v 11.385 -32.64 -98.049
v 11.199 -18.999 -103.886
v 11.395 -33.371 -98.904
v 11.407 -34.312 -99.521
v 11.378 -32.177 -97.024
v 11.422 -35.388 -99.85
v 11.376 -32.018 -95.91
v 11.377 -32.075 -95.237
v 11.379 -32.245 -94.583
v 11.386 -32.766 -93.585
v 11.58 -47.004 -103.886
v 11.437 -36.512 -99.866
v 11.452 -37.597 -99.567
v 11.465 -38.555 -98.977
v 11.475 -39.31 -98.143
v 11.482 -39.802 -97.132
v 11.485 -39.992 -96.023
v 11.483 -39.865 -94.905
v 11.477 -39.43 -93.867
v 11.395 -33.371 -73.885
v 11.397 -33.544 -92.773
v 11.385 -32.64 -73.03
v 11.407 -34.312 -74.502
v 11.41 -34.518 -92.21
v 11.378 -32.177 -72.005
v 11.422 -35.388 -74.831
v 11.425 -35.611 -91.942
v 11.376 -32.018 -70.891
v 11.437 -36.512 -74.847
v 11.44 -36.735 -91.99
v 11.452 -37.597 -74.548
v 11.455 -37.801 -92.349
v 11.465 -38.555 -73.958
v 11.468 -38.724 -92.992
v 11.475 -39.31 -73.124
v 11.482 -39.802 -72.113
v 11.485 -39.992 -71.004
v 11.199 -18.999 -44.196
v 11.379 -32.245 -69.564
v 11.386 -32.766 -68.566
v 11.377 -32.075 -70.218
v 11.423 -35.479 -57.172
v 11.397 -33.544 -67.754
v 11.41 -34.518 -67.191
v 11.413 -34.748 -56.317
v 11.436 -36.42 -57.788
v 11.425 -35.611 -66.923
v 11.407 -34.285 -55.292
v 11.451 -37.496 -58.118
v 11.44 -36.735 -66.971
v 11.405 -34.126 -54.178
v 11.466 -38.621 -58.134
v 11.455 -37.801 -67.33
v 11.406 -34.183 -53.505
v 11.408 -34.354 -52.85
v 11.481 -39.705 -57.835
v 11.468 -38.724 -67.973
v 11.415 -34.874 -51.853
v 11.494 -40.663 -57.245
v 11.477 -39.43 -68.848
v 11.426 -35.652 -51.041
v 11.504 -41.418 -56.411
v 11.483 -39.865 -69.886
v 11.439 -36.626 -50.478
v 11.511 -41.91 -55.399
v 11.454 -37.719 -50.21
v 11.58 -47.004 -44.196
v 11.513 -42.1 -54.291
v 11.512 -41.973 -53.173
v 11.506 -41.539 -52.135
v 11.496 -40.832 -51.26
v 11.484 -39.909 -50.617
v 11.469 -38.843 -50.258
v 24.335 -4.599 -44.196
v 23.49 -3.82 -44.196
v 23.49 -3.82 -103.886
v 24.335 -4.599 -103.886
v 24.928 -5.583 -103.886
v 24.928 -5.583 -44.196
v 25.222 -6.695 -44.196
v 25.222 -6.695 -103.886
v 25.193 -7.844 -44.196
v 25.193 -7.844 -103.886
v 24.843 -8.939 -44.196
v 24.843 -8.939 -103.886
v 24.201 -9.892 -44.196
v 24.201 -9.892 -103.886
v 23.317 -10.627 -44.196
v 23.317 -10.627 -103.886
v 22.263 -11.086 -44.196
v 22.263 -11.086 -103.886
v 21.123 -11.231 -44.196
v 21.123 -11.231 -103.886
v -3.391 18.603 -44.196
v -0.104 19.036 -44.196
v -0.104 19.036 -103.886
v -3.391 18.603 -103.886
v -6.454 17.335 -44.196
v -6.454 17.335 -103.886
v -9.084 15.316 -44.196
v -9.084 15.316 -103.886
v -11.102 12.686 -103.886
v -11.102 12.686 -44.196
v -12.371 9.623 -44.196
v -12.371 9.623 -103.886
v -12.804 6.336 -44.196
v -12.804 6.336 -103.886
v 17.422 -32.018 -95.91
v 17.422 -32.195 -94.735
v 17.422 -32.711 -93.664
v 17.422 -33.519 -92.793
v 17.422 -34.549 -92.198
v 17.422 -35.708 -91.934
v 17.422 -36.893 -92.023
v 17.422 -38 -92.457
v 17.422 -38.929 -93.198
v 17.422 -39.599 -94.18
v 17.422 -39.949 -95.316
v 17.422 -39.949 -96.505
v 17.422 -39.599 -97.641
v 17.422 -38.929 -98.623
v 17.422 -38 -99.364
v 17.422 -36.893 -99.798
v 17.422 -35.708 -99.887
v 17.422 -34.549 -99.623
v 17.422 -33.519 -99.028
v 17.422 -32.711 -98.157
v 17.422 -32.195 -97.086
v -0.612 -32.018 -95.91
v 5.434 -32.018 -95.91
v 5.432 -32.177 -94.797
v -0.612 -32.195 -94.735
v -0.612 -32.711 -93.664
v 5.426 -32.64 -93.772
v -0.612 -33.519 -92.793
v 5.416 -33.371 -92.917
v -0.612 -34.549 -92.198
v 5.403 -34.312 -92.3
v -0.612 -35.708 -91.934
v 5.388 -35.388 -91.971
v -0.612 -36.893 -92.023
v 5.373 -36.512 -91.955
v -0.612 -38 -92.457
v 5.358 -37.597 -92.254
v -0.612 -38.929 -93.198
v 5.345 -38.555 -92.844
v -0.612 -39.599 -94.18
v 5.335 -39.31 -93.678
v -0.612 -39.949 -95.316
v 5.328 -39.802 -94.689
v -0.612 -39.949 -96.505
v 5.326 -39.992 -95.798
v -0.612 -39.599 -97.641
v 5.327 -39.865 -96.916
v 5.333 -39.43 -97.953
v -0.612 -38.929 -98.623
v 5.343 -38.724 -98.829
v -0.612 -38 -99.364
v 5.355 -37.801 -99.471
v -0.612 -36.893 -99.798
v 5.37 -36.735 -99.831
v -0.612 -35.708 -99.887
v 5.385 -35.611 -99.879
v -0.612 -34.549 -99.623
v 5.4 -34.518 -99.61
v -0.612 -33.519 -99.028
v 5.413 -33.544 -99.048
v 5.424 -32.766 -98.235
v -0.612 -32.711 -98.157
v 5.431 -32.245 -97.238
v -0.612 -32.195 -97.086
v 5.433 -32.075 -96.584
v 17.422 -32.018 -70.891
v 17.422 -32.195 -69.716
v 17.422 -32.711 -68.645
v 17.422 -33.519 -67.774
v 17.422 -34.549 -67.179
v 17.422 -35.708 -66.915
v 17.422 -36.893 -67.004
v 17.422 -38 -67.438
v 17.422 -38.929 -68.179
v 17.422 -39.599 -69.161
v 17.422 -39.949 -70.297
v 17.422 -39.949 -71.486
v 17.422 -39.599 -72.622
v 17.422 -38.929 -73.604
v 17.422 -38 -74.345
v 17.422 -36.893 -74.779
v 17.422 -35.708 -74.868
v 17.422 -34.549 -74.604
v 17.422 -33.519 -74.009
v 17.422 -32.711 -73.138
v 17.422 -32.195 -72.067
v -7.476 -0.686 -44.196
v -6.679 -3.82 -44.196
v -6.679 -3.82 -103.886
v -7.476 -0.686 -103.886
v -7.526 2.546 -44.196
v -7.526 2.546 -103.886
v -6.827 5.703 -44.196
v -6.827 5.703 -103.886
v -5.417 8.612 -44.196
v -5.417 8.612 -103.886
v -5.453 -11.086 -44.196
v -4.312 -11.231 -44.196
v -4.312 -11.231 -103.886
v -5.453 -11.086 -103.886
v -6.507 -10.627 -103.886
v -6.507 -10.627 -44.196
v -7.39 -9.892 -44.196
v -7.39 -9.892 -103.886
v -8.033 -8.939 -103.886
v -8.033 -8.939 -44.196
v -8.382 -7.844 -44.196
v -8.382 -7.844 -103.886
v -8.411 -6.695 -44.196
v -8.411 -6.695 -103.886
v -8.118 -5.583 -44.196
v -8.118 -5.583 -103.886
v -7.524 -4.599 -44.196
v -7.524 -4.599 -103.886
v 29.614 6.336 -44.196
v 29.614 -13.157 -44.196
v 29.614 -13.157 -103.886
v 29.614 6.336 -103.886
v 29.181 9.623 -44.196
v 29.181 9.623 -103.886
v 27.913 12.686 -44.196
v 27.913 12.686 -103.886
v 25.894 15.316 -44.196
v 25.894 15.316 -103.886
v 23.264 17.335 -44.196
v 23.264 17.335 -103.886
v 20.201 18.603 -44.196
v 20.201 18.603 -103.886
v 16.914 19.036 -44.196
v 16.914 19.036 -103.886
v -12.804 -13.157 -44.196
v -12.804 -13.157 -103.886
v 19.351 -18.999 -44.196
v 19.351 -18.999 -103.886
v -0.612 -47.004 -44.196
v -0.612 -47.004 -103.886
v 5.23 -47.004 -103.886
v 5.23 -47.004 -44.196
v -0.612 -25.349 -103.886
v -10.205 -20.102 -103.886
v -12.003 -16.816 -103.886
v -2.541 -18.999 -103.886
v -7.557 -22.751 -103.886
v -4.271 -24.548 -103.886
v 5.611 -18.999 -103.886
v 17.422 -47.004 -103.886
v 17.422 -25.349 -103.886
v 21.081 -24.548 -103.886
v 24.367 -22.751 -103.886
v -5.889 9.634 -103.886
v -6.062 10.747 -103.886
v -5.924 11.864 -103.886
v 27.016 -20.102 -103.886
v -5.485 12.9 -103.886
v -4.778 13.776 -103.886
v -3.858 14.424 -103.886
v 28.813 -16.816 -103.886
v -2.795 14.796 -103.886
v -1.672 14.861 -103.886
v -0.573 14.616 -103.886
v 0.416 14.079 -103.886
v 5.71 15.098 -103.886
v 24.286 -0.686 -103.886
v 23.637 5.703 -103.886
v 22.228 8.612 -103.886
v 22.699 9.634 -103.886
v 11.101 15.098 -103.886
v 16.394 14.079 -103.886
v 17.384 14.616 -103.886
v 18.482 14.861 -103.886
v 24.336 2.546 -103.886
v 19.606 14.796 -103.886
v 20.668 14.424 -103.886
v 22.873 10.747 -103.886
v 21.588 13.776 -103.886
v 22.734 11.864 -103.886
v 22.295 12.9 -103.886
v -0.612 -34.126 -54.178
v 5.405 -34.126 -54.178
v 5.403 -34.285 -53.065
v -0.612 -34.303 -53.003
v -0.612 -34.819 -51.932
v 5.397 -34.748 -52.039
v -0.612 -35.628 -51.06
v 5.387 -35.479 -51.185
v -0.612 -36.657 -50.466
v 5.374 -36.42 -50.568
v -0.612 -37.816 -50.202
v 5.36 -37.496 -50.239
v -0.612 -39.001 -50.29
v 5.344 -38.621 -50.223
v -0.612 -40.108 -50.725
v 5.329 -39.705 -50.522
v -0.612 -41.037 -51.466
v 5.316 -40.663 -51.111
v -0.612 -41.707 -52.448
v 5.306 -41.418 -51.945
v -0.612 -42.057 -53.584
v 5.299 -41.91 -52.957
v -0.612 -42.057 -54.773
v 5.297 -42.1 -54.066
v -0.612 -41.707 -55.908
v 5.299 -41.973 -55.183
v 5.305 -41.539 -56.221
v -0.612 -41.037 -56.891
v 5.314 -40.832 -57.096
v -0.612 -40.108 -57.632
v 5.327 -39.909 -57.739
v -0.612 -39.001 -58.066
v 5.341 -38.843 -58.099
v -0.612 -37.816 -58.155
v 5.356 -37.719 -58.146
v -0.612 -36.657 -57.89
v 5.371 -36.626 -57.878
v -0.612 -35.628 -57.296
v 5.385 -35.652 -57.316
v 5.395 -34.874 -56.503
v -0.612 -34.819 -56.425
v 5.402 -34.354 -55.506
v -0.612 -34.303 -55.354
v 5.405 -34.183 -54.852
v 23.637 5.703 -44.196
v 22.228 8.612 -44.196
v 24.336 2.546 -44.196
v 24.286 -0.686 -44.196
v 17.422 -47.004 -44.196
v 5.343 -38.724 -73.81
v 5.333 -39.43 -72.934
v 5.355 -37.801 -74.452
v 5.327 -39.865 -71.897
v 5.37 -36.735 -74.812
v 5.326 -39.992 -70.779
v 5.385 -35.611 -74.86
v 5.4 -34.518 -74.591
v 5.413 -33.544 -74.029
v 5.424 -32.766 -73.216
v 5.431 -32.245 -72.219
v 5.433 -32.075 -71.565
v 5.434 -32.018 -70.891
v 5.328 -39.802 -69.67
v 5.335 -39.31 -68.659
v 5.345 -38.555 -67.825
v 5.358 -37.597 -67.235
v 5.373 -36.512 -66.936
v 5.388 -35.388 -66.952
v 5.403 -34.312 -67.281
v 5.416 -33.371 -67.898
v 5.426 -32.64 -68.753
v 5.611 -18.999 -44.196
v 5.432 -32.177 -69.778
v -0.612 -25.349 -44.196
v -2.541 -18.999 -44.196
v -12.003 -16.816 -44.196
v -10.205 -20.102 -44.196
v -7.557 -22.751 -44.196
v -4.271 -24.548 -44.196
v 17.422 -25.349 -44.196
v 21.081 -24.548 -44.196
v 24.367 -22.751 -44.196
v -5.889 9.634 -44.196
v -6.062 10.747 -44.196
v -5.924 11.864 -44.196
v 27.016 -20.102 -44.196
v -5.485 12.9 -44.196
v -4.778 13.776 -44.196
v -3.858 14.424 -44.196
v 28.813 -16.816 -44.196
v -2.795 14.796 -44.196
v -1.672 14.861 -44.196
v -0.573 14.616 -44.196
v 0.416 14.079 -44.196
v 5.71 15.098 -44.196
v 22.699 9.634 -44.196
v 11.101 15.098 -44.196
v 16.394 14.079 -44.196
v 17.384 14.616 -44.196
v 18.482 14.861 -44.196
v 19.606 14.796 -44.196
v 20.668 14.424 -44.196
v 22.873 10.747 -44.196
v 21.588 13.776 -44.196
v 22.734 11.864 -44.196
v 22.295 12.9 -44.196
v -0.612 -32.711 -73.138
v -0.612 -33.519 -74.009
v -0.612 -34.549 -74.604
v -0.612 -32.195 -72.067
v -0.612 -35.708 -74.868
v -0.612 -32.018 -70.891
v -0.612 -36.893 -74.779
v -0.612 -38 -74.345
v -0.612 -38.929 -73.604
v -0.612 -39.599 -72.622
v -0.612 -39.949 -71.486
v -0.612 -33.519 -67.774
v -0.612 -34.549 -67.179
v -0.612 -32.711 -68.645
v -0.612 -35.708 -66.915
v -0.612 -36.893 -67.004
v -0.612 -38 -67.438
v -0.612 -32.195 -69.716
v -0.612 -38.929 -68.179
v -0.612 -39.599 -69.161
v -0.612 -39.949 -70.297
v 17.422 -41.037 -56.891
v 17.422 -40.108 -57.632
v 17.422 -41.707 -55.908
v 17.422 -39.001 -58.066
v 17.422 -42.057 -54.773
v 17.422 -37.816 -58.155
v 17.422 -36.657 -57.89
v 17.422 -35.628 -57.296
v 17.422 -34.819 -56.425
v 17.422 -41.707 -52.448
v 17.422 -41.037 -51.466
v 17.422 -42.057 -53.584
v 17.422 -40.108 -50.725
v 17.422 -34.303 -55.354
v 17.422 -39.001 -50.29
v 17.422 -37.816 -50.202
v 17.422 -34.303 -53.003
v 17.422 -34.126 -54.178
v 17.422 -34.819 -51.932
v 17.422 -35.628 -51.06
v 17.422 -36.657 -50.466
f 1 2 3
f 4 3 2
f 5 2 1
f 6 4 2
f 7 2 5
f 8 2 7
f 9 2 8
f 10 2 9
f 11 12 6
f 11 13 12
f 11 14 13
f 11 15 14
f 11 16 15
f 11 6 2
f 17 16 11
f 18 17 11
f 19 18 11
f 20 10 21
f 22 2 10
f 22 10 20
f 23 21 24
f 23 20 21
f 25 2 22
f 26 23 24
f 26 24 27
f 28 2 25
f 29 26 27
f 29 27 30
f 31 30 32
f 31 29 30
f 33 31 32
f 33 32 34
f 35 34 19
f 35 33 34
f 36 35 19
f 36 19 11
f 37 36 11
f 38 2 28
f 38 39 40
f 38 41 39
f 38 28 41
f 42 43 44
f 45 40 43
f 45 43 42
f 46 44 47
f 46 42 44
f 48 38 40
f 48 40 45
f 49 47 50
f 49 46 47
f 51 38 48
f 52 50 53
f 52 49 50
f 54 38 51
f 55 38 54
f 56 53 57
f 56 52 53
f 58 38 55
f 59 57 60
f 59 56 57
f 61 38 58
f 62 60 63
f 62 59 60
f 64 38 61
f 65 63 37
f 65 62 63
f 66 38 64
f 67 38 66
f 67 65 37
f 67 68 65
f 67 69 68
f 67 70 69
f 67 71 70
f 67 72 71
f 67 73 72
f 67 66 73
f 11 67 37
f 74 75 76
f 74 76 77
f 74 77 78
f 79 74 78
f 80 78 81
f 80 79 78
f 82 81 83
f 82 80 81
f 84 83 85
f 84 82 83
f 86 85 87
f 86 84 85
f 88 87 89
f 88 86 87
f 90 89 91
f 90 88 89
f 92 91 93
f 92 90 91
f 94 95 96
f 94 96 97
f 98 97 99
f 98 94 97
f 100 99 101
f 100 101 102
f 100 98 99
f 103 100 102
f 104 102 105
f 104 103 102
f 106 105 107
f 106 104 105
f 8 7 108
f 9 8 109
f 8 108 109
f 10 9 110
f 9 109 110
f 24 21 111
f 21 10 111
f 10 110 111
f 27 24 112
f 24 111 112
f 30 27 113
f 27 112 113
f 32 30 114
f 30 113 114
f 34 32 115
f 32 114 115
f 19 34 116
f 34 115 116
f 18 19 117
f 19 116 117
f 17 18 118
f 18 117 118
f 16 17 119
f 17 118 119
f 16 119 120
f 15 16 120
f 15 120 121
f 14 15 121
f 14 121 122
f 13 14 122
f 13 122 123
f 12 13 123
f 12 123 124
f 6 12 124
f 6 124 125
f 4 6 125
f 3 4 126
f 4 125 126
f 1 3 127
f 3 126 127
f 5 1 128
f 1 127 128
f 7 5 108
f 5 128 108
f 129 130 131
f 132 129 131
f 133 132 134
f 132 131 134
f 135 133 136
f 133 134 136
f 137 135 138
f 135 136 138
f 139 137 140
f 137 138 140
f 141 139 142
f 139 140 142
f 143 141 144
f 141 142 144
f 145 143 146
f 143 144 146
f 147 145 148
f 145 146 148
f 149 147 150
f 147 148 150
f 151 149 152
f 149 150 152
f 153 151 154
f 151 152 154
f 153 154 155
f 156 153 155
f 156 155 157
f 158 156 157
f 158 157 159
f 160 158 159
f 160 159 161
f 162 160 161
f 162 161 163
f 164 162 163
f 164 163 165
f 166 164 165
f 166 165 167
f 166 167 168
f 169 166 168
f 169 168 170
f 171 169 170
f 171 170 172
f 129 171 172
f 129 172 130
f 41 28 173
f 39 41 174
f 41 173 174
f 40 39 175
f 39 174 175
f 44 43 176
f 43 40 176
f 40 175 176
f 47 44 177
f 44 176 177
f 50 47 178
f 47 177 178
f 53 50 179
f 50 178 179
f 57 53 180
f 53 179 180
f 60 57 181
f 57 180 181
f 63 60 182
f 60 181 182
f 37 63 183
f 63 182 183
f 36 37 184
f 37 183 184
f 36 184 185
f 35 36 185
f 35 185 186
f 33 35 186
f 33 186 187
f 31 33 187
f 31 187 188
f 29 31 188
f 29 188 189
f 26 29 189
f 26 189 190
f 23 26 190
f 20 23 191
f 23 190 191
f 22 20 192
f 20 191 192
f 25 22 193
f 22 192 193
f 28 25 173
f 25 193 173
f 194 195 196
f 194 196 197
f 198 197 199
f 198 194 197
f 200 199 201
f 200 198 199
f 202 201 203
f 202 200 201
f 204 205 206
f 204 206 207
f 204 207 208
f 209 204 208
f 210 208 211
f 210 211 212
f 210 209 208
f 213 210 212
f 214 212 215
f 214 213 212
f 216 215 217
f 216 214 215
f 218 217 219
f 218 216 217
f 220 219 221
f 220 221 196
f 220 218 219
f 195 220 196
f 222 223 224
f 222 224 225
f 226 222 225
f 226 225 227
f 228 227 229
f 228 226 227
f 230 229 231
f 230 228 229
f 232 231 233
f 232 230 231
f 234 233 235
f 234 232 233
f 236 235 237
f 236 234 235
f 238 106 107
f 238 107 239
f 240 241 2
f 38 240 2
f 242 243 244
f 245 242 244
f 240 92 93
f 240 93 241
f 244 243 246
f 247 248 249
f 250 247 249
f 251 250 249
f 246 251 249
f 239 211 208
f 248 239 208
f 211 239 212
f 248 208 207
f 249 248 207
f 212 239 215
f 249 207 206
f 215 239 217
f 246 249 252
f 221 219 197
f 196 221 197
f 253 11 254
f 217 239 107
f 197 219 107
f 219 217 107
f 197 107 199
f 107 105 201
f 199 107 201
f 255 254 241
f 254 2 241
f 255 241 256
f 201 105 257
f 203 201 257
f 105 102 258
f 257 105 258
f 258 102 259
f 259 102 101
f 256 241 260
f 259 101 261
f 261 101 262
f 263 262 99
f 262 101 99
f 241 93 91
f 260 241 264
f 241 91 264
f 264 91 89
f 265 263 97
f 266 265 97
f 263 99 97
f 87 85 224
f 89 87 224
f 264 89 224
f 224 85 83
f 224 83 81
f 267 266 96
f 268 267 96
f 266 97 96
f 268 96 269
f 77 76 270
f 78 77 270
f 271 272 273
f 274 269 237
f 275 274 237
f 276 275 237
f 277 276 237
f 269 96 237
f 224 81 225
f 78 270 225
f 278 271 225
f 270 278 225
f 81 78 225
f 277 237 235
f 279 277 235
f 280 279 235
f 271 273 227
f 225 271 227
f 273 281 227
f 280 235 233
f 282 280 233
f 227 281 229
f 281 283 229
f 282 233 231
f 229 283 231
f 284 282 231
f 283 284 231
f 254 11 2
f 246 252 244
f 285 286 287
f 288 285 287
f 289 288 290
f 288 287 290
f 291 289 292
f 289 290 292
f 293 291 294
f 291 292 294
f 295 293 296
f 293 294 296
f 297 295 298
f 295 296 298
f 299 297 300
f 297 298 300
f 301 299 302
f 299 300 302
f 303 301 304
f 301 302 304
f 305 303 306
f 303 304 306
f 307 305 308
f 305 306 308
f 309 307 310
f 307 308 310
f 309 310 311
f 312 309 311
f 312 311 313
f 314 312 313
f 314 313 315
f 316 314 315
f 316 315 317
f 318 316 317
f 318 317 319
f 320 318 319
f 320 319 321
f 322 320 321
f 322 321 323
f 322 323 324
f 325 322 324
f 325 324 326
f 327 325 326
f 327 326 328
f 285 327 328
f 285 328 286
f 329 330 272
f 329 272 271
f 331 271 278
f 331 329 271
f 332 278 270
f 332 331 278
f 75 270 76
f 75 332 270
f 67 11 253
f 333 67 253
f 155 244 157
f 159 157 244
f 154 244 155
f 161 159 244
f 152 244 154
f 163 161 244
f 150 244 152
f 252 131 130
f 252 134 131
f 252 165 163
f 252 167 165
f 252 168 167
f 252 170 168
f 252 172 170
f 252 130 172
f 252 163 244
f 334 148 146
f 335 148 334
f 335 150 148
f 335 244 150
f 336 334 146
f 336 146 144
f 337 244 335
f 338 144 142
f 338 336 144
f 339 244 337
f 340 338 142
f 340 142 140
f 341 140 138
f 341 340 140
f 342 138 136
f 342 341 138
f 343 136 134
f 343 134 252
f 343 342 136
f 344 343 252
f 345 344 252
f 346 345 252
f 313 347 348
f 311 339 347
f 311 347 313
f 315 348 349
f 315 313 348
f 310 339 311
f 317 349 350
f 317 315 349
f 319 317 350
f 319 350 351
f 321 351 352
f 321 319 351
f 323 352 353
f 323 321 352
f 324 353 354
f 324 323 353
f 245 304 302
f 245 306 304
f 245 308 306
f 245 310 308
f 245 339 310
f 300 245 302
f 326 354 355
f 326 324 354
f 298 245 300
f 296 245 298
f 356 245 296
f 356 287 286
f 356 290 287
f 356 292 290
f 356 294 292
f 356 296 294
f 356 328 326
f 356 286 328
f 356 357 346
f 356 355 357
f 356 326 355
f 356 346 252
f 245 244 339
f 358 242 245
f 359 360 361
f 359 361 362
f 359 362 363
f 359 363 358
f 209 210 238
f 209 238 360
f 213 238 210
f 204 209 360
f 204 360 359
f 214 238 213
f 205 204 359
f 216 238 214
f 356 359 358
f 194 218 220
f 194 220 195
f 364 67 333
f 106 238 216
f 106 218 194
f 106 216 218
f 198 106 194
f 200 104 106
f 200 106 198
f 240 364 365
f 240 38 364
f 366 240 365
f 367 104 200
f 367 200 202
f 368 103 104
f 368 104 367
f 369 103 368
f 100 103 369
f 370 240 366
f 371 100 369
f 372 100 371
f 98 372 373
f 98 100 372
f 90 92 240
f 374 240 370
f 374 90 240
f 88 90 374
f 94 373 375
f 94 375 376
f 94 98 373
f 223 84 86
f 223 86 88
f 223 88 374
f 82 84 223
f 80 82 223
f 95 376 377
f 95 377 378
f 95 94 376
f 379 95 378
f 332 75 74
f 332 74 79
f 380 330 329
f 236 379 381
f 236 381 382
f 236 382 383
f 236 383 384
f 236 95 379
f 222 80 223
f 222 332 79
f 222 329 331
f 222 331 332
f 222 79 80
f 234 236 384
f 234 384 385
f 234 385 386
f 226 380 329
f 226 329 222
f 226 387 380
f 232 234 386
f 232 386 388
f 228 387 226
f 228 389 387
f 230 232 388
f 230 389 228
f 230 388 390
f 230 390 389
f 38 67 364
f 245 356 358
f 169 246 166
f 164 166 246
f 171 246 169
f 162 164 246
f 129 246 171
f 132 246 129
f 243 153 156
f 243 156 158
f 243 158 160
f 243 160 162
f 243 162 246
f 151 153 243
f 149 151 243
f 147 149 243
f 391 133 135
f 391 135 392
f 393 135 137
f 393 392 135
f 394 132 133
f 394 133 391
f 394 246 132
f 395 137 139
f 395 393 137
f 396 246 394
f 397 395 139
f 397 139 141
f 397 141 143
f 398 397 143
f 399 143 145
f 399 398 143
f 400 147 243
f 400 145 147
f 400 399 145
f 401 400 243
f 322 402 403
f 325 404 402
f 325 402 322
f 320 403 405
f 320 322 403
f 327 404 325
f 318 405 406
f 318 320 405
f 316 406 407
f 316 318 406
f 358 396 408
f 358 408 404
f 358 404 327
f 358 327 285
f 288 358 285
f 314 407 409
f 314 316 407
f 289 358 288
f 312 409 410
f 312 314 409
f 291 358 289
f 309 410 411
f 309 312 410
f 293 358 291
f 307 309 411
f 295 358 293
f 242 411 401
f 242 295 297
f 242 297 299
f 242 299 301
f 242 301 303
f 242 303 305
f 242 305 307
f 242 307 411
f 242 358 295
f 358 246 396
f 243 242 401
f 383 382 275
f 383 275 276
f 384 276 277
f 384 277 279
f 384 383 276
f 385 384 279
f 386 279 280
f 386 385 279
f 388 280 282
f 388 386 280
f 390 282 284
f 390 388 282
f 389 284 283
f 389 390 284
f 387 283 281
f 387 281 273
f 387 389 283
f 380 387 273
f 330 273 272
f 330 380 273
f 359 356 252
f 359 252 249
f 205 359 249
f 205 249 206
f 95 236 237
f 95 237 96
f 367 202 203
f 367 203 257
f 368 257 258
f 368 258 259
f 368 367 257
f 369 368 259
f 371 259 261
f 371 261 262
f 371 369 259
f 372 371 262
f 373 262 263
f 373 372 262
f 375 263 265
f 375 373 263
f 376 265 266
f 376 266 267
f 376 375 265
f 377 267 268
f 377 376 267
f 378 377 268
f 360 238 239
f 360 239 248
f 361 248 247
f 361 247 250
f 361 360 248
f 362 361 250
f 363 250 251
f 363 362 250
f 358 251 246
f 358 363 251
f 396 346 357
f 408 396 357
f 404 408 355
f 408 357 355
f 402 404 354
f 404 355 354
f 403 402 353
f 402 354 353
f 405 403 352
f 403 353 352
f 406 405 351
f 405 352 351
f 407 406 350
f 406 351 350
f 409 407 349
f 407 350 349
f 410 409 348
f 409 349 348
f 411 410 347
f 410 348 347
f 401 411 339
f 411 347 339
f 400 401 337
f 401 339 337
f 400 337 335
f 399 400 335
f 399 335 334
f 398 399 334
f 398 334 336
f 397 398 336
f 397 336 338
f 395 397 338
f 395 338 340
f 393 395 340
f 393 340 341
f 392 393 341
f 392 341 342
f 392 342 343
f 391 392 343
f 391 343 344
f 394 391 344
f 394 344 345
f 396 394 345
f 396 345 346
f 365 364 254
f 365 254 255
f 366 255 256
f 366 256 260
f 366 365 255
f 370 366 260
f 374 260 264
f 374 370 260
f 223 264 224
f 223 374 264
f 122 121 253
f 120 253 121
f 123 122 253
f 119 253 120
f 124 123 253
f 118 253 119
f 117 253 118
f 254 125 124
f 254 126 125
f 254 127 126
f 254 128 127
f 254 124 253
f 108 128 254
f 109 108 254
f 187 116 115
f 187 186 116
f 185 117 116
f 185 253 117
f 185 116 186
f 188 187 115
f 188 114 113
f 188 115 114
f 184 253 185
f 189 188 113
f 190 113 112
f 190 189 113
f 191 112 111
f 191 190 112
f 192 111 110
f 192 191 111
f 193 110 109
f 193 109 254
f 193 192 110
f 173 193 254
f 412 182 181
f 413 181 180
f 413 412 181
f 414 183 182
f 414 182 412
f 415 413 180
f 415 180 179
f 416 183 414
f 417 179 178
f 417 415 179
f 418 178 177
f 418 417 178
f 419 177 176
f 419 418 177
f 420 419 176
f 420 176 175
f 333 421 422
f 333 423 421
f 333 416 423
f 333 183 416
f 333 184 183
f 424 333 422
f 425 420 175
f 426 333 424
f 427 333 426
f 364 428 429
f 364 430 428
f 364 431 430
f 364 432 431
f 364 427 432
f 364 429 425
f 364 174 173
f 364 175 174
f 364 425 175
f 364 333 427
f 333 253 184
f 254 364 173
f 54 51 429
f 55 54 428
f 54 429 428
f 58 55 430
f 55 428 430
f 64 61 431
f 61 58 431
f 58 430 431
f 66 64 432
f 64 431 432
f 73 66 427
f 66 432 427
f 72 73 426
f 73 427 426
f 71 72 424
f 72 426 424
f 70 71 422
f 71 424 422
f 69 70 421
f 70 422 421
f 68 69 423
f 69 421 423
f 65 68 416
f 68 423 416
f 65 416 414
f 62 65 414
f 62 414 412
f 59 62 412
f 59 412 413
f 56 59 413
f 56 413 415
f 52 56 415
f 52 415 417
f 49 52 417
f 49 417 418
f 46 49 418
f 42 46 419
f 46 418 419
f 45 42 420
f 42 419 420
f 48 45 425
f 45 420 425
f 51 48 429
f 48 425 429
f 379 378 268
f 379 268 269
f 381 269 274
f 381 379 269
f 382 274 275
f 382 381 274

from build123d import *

# Parameters (mm, degrees)
BOSS_EXTRUDE1_DEPTH = 59.69
SKETCH31_R          = 3.9878
CUT_EXTRUDE1_DEPTH  = 31.226


with BuildPart() as part:
    # Sketch30 → Boss-Extrude1 (new body)
    with BuildSketch(Plane(origin=(0, 0, -44.196), x_dir=(-1, 0, 0), z_dir=(0, 0, -1))):
        with BuildLine():
            Line((-21.122639806, -11.230837818), (-19.351377941, -18.999086285))
            Line((-19.351377941, -18.999086285), (-11.19917043, -18.999086285))
            Line((-11.19917043, -18.999086285), (-11.58017043, -47.00394942))
            Line((-11.58017043, -47.00394942), (-17.42217043, -47.00394942))
            Line((-17.42217043, -47.00394942), (-17.42217043, -26.68394942))
            Line((-17.42217043, -26.68394942), (-17.42217043, -25.349086285))
            ThreePointArc((-17.42217043, -25.349086285), (-25.786020569, -21.520936424), (-29.61417043, -13.157086285))
            Line((-29.61417043, -13.157086285), (-29.61417043, 6.33605058))
            ThreePointArc((-29.61417043, 6.33605058), (-25.894426551, 15.316306701), (-16.91417043, 19.03605058))
            Line((-16.91417043, 19.03605058), (0.10382957, 19.03605058))
            ThreePointArc((0.10382957, 19.03605058), (9.084085691, 15.316306701), (12.80382957, 6.33605058))
            Line((12.80382957, 6.33605058), (12.80382957, -13.157086285))
            ThreePointArc((12.80382957, -13.157086285), (8.975679709, -21.520936424), (0.61182957, -25.349086285))
            Line((0.61182957, -25.349086285), (0.61182957, -26.68394942))
            Line((0.61182957, -26.68394942), (0.61182957, -47.00394942))
            Line((0.61182957, -47.00394942), (-5.23017043, -47.00394942))
            Line((-5.23017043, -47.00394942), (-5.61117043, -18.999086285))
            Line((-5.61117043, -18.999086285), (2.54103708, -18.999086285))
            Line((2.54103708, -18.999086285), (4.312298946, -11.230837818))
            ThreePointArc((4.312298946, -11.230837818), (8.246380302, -8.403768679), (6.679296605, -3.81971319))
            ThreePointArc((6.679296605, -3.81971319), (7.525853874, 2.546365897), (5.417372104, 8.61249537))
            ThreePointArc((5.417372104, 8.61249537), (4.777900298, 13.775697179), (-0.415899, 14.079054992))
            ThreePointArc((-0.415899, 14.079054992), (-8.40517043, 15.22605058), (-16.394441861, 14.079054992))
            ThreePointArc((-16.394441861, 14.079054992), (-21.588241548, 13.775696815), (-22.227712388, 8.612494473))
            ThreePointArc((-22.227712388, 8.612494473), (-24.336184911, 2.546364848), (-23.489636452, -3.819712493))
            ThreePointArc((-23.489636452, -3.819712493), (-25.056721349, -8.403768093), (-21.122639806, -11.230837818))
        make_face()
    extrude(amount=BOSS_EXTRUDE1_DEPTH)

    # Sketch31 → Cut-Extrude1 (cut, through all)
    with BuildSketch(Plane(origin=(17.42217043, 0, 0), x_dir=(0, 0, -1), z_dir=(1, 0, 0))):
        with Locations(Location((95.9104, -36.00574942, 0), (0, 0, 90))):  # turned: the seam where the file's is
            Circle(SKETCH31_R)
        with Locations(Location((70.8914, -36.00574942, 0), (0, 0, 90))):  # turned: the seam where the file's is
            Circle(SKETCH31_R)
        with Locations(Location((54.1782, -38.11394942, 0), (0, 0, 90))):  # turned: the seam where the file's is
            Circle(SKETCH31_R)
    extrude(amount=-CUT_EXTRUDE1_DEPTH, mode=Mode.SUBTRACT)


solid = part.part
